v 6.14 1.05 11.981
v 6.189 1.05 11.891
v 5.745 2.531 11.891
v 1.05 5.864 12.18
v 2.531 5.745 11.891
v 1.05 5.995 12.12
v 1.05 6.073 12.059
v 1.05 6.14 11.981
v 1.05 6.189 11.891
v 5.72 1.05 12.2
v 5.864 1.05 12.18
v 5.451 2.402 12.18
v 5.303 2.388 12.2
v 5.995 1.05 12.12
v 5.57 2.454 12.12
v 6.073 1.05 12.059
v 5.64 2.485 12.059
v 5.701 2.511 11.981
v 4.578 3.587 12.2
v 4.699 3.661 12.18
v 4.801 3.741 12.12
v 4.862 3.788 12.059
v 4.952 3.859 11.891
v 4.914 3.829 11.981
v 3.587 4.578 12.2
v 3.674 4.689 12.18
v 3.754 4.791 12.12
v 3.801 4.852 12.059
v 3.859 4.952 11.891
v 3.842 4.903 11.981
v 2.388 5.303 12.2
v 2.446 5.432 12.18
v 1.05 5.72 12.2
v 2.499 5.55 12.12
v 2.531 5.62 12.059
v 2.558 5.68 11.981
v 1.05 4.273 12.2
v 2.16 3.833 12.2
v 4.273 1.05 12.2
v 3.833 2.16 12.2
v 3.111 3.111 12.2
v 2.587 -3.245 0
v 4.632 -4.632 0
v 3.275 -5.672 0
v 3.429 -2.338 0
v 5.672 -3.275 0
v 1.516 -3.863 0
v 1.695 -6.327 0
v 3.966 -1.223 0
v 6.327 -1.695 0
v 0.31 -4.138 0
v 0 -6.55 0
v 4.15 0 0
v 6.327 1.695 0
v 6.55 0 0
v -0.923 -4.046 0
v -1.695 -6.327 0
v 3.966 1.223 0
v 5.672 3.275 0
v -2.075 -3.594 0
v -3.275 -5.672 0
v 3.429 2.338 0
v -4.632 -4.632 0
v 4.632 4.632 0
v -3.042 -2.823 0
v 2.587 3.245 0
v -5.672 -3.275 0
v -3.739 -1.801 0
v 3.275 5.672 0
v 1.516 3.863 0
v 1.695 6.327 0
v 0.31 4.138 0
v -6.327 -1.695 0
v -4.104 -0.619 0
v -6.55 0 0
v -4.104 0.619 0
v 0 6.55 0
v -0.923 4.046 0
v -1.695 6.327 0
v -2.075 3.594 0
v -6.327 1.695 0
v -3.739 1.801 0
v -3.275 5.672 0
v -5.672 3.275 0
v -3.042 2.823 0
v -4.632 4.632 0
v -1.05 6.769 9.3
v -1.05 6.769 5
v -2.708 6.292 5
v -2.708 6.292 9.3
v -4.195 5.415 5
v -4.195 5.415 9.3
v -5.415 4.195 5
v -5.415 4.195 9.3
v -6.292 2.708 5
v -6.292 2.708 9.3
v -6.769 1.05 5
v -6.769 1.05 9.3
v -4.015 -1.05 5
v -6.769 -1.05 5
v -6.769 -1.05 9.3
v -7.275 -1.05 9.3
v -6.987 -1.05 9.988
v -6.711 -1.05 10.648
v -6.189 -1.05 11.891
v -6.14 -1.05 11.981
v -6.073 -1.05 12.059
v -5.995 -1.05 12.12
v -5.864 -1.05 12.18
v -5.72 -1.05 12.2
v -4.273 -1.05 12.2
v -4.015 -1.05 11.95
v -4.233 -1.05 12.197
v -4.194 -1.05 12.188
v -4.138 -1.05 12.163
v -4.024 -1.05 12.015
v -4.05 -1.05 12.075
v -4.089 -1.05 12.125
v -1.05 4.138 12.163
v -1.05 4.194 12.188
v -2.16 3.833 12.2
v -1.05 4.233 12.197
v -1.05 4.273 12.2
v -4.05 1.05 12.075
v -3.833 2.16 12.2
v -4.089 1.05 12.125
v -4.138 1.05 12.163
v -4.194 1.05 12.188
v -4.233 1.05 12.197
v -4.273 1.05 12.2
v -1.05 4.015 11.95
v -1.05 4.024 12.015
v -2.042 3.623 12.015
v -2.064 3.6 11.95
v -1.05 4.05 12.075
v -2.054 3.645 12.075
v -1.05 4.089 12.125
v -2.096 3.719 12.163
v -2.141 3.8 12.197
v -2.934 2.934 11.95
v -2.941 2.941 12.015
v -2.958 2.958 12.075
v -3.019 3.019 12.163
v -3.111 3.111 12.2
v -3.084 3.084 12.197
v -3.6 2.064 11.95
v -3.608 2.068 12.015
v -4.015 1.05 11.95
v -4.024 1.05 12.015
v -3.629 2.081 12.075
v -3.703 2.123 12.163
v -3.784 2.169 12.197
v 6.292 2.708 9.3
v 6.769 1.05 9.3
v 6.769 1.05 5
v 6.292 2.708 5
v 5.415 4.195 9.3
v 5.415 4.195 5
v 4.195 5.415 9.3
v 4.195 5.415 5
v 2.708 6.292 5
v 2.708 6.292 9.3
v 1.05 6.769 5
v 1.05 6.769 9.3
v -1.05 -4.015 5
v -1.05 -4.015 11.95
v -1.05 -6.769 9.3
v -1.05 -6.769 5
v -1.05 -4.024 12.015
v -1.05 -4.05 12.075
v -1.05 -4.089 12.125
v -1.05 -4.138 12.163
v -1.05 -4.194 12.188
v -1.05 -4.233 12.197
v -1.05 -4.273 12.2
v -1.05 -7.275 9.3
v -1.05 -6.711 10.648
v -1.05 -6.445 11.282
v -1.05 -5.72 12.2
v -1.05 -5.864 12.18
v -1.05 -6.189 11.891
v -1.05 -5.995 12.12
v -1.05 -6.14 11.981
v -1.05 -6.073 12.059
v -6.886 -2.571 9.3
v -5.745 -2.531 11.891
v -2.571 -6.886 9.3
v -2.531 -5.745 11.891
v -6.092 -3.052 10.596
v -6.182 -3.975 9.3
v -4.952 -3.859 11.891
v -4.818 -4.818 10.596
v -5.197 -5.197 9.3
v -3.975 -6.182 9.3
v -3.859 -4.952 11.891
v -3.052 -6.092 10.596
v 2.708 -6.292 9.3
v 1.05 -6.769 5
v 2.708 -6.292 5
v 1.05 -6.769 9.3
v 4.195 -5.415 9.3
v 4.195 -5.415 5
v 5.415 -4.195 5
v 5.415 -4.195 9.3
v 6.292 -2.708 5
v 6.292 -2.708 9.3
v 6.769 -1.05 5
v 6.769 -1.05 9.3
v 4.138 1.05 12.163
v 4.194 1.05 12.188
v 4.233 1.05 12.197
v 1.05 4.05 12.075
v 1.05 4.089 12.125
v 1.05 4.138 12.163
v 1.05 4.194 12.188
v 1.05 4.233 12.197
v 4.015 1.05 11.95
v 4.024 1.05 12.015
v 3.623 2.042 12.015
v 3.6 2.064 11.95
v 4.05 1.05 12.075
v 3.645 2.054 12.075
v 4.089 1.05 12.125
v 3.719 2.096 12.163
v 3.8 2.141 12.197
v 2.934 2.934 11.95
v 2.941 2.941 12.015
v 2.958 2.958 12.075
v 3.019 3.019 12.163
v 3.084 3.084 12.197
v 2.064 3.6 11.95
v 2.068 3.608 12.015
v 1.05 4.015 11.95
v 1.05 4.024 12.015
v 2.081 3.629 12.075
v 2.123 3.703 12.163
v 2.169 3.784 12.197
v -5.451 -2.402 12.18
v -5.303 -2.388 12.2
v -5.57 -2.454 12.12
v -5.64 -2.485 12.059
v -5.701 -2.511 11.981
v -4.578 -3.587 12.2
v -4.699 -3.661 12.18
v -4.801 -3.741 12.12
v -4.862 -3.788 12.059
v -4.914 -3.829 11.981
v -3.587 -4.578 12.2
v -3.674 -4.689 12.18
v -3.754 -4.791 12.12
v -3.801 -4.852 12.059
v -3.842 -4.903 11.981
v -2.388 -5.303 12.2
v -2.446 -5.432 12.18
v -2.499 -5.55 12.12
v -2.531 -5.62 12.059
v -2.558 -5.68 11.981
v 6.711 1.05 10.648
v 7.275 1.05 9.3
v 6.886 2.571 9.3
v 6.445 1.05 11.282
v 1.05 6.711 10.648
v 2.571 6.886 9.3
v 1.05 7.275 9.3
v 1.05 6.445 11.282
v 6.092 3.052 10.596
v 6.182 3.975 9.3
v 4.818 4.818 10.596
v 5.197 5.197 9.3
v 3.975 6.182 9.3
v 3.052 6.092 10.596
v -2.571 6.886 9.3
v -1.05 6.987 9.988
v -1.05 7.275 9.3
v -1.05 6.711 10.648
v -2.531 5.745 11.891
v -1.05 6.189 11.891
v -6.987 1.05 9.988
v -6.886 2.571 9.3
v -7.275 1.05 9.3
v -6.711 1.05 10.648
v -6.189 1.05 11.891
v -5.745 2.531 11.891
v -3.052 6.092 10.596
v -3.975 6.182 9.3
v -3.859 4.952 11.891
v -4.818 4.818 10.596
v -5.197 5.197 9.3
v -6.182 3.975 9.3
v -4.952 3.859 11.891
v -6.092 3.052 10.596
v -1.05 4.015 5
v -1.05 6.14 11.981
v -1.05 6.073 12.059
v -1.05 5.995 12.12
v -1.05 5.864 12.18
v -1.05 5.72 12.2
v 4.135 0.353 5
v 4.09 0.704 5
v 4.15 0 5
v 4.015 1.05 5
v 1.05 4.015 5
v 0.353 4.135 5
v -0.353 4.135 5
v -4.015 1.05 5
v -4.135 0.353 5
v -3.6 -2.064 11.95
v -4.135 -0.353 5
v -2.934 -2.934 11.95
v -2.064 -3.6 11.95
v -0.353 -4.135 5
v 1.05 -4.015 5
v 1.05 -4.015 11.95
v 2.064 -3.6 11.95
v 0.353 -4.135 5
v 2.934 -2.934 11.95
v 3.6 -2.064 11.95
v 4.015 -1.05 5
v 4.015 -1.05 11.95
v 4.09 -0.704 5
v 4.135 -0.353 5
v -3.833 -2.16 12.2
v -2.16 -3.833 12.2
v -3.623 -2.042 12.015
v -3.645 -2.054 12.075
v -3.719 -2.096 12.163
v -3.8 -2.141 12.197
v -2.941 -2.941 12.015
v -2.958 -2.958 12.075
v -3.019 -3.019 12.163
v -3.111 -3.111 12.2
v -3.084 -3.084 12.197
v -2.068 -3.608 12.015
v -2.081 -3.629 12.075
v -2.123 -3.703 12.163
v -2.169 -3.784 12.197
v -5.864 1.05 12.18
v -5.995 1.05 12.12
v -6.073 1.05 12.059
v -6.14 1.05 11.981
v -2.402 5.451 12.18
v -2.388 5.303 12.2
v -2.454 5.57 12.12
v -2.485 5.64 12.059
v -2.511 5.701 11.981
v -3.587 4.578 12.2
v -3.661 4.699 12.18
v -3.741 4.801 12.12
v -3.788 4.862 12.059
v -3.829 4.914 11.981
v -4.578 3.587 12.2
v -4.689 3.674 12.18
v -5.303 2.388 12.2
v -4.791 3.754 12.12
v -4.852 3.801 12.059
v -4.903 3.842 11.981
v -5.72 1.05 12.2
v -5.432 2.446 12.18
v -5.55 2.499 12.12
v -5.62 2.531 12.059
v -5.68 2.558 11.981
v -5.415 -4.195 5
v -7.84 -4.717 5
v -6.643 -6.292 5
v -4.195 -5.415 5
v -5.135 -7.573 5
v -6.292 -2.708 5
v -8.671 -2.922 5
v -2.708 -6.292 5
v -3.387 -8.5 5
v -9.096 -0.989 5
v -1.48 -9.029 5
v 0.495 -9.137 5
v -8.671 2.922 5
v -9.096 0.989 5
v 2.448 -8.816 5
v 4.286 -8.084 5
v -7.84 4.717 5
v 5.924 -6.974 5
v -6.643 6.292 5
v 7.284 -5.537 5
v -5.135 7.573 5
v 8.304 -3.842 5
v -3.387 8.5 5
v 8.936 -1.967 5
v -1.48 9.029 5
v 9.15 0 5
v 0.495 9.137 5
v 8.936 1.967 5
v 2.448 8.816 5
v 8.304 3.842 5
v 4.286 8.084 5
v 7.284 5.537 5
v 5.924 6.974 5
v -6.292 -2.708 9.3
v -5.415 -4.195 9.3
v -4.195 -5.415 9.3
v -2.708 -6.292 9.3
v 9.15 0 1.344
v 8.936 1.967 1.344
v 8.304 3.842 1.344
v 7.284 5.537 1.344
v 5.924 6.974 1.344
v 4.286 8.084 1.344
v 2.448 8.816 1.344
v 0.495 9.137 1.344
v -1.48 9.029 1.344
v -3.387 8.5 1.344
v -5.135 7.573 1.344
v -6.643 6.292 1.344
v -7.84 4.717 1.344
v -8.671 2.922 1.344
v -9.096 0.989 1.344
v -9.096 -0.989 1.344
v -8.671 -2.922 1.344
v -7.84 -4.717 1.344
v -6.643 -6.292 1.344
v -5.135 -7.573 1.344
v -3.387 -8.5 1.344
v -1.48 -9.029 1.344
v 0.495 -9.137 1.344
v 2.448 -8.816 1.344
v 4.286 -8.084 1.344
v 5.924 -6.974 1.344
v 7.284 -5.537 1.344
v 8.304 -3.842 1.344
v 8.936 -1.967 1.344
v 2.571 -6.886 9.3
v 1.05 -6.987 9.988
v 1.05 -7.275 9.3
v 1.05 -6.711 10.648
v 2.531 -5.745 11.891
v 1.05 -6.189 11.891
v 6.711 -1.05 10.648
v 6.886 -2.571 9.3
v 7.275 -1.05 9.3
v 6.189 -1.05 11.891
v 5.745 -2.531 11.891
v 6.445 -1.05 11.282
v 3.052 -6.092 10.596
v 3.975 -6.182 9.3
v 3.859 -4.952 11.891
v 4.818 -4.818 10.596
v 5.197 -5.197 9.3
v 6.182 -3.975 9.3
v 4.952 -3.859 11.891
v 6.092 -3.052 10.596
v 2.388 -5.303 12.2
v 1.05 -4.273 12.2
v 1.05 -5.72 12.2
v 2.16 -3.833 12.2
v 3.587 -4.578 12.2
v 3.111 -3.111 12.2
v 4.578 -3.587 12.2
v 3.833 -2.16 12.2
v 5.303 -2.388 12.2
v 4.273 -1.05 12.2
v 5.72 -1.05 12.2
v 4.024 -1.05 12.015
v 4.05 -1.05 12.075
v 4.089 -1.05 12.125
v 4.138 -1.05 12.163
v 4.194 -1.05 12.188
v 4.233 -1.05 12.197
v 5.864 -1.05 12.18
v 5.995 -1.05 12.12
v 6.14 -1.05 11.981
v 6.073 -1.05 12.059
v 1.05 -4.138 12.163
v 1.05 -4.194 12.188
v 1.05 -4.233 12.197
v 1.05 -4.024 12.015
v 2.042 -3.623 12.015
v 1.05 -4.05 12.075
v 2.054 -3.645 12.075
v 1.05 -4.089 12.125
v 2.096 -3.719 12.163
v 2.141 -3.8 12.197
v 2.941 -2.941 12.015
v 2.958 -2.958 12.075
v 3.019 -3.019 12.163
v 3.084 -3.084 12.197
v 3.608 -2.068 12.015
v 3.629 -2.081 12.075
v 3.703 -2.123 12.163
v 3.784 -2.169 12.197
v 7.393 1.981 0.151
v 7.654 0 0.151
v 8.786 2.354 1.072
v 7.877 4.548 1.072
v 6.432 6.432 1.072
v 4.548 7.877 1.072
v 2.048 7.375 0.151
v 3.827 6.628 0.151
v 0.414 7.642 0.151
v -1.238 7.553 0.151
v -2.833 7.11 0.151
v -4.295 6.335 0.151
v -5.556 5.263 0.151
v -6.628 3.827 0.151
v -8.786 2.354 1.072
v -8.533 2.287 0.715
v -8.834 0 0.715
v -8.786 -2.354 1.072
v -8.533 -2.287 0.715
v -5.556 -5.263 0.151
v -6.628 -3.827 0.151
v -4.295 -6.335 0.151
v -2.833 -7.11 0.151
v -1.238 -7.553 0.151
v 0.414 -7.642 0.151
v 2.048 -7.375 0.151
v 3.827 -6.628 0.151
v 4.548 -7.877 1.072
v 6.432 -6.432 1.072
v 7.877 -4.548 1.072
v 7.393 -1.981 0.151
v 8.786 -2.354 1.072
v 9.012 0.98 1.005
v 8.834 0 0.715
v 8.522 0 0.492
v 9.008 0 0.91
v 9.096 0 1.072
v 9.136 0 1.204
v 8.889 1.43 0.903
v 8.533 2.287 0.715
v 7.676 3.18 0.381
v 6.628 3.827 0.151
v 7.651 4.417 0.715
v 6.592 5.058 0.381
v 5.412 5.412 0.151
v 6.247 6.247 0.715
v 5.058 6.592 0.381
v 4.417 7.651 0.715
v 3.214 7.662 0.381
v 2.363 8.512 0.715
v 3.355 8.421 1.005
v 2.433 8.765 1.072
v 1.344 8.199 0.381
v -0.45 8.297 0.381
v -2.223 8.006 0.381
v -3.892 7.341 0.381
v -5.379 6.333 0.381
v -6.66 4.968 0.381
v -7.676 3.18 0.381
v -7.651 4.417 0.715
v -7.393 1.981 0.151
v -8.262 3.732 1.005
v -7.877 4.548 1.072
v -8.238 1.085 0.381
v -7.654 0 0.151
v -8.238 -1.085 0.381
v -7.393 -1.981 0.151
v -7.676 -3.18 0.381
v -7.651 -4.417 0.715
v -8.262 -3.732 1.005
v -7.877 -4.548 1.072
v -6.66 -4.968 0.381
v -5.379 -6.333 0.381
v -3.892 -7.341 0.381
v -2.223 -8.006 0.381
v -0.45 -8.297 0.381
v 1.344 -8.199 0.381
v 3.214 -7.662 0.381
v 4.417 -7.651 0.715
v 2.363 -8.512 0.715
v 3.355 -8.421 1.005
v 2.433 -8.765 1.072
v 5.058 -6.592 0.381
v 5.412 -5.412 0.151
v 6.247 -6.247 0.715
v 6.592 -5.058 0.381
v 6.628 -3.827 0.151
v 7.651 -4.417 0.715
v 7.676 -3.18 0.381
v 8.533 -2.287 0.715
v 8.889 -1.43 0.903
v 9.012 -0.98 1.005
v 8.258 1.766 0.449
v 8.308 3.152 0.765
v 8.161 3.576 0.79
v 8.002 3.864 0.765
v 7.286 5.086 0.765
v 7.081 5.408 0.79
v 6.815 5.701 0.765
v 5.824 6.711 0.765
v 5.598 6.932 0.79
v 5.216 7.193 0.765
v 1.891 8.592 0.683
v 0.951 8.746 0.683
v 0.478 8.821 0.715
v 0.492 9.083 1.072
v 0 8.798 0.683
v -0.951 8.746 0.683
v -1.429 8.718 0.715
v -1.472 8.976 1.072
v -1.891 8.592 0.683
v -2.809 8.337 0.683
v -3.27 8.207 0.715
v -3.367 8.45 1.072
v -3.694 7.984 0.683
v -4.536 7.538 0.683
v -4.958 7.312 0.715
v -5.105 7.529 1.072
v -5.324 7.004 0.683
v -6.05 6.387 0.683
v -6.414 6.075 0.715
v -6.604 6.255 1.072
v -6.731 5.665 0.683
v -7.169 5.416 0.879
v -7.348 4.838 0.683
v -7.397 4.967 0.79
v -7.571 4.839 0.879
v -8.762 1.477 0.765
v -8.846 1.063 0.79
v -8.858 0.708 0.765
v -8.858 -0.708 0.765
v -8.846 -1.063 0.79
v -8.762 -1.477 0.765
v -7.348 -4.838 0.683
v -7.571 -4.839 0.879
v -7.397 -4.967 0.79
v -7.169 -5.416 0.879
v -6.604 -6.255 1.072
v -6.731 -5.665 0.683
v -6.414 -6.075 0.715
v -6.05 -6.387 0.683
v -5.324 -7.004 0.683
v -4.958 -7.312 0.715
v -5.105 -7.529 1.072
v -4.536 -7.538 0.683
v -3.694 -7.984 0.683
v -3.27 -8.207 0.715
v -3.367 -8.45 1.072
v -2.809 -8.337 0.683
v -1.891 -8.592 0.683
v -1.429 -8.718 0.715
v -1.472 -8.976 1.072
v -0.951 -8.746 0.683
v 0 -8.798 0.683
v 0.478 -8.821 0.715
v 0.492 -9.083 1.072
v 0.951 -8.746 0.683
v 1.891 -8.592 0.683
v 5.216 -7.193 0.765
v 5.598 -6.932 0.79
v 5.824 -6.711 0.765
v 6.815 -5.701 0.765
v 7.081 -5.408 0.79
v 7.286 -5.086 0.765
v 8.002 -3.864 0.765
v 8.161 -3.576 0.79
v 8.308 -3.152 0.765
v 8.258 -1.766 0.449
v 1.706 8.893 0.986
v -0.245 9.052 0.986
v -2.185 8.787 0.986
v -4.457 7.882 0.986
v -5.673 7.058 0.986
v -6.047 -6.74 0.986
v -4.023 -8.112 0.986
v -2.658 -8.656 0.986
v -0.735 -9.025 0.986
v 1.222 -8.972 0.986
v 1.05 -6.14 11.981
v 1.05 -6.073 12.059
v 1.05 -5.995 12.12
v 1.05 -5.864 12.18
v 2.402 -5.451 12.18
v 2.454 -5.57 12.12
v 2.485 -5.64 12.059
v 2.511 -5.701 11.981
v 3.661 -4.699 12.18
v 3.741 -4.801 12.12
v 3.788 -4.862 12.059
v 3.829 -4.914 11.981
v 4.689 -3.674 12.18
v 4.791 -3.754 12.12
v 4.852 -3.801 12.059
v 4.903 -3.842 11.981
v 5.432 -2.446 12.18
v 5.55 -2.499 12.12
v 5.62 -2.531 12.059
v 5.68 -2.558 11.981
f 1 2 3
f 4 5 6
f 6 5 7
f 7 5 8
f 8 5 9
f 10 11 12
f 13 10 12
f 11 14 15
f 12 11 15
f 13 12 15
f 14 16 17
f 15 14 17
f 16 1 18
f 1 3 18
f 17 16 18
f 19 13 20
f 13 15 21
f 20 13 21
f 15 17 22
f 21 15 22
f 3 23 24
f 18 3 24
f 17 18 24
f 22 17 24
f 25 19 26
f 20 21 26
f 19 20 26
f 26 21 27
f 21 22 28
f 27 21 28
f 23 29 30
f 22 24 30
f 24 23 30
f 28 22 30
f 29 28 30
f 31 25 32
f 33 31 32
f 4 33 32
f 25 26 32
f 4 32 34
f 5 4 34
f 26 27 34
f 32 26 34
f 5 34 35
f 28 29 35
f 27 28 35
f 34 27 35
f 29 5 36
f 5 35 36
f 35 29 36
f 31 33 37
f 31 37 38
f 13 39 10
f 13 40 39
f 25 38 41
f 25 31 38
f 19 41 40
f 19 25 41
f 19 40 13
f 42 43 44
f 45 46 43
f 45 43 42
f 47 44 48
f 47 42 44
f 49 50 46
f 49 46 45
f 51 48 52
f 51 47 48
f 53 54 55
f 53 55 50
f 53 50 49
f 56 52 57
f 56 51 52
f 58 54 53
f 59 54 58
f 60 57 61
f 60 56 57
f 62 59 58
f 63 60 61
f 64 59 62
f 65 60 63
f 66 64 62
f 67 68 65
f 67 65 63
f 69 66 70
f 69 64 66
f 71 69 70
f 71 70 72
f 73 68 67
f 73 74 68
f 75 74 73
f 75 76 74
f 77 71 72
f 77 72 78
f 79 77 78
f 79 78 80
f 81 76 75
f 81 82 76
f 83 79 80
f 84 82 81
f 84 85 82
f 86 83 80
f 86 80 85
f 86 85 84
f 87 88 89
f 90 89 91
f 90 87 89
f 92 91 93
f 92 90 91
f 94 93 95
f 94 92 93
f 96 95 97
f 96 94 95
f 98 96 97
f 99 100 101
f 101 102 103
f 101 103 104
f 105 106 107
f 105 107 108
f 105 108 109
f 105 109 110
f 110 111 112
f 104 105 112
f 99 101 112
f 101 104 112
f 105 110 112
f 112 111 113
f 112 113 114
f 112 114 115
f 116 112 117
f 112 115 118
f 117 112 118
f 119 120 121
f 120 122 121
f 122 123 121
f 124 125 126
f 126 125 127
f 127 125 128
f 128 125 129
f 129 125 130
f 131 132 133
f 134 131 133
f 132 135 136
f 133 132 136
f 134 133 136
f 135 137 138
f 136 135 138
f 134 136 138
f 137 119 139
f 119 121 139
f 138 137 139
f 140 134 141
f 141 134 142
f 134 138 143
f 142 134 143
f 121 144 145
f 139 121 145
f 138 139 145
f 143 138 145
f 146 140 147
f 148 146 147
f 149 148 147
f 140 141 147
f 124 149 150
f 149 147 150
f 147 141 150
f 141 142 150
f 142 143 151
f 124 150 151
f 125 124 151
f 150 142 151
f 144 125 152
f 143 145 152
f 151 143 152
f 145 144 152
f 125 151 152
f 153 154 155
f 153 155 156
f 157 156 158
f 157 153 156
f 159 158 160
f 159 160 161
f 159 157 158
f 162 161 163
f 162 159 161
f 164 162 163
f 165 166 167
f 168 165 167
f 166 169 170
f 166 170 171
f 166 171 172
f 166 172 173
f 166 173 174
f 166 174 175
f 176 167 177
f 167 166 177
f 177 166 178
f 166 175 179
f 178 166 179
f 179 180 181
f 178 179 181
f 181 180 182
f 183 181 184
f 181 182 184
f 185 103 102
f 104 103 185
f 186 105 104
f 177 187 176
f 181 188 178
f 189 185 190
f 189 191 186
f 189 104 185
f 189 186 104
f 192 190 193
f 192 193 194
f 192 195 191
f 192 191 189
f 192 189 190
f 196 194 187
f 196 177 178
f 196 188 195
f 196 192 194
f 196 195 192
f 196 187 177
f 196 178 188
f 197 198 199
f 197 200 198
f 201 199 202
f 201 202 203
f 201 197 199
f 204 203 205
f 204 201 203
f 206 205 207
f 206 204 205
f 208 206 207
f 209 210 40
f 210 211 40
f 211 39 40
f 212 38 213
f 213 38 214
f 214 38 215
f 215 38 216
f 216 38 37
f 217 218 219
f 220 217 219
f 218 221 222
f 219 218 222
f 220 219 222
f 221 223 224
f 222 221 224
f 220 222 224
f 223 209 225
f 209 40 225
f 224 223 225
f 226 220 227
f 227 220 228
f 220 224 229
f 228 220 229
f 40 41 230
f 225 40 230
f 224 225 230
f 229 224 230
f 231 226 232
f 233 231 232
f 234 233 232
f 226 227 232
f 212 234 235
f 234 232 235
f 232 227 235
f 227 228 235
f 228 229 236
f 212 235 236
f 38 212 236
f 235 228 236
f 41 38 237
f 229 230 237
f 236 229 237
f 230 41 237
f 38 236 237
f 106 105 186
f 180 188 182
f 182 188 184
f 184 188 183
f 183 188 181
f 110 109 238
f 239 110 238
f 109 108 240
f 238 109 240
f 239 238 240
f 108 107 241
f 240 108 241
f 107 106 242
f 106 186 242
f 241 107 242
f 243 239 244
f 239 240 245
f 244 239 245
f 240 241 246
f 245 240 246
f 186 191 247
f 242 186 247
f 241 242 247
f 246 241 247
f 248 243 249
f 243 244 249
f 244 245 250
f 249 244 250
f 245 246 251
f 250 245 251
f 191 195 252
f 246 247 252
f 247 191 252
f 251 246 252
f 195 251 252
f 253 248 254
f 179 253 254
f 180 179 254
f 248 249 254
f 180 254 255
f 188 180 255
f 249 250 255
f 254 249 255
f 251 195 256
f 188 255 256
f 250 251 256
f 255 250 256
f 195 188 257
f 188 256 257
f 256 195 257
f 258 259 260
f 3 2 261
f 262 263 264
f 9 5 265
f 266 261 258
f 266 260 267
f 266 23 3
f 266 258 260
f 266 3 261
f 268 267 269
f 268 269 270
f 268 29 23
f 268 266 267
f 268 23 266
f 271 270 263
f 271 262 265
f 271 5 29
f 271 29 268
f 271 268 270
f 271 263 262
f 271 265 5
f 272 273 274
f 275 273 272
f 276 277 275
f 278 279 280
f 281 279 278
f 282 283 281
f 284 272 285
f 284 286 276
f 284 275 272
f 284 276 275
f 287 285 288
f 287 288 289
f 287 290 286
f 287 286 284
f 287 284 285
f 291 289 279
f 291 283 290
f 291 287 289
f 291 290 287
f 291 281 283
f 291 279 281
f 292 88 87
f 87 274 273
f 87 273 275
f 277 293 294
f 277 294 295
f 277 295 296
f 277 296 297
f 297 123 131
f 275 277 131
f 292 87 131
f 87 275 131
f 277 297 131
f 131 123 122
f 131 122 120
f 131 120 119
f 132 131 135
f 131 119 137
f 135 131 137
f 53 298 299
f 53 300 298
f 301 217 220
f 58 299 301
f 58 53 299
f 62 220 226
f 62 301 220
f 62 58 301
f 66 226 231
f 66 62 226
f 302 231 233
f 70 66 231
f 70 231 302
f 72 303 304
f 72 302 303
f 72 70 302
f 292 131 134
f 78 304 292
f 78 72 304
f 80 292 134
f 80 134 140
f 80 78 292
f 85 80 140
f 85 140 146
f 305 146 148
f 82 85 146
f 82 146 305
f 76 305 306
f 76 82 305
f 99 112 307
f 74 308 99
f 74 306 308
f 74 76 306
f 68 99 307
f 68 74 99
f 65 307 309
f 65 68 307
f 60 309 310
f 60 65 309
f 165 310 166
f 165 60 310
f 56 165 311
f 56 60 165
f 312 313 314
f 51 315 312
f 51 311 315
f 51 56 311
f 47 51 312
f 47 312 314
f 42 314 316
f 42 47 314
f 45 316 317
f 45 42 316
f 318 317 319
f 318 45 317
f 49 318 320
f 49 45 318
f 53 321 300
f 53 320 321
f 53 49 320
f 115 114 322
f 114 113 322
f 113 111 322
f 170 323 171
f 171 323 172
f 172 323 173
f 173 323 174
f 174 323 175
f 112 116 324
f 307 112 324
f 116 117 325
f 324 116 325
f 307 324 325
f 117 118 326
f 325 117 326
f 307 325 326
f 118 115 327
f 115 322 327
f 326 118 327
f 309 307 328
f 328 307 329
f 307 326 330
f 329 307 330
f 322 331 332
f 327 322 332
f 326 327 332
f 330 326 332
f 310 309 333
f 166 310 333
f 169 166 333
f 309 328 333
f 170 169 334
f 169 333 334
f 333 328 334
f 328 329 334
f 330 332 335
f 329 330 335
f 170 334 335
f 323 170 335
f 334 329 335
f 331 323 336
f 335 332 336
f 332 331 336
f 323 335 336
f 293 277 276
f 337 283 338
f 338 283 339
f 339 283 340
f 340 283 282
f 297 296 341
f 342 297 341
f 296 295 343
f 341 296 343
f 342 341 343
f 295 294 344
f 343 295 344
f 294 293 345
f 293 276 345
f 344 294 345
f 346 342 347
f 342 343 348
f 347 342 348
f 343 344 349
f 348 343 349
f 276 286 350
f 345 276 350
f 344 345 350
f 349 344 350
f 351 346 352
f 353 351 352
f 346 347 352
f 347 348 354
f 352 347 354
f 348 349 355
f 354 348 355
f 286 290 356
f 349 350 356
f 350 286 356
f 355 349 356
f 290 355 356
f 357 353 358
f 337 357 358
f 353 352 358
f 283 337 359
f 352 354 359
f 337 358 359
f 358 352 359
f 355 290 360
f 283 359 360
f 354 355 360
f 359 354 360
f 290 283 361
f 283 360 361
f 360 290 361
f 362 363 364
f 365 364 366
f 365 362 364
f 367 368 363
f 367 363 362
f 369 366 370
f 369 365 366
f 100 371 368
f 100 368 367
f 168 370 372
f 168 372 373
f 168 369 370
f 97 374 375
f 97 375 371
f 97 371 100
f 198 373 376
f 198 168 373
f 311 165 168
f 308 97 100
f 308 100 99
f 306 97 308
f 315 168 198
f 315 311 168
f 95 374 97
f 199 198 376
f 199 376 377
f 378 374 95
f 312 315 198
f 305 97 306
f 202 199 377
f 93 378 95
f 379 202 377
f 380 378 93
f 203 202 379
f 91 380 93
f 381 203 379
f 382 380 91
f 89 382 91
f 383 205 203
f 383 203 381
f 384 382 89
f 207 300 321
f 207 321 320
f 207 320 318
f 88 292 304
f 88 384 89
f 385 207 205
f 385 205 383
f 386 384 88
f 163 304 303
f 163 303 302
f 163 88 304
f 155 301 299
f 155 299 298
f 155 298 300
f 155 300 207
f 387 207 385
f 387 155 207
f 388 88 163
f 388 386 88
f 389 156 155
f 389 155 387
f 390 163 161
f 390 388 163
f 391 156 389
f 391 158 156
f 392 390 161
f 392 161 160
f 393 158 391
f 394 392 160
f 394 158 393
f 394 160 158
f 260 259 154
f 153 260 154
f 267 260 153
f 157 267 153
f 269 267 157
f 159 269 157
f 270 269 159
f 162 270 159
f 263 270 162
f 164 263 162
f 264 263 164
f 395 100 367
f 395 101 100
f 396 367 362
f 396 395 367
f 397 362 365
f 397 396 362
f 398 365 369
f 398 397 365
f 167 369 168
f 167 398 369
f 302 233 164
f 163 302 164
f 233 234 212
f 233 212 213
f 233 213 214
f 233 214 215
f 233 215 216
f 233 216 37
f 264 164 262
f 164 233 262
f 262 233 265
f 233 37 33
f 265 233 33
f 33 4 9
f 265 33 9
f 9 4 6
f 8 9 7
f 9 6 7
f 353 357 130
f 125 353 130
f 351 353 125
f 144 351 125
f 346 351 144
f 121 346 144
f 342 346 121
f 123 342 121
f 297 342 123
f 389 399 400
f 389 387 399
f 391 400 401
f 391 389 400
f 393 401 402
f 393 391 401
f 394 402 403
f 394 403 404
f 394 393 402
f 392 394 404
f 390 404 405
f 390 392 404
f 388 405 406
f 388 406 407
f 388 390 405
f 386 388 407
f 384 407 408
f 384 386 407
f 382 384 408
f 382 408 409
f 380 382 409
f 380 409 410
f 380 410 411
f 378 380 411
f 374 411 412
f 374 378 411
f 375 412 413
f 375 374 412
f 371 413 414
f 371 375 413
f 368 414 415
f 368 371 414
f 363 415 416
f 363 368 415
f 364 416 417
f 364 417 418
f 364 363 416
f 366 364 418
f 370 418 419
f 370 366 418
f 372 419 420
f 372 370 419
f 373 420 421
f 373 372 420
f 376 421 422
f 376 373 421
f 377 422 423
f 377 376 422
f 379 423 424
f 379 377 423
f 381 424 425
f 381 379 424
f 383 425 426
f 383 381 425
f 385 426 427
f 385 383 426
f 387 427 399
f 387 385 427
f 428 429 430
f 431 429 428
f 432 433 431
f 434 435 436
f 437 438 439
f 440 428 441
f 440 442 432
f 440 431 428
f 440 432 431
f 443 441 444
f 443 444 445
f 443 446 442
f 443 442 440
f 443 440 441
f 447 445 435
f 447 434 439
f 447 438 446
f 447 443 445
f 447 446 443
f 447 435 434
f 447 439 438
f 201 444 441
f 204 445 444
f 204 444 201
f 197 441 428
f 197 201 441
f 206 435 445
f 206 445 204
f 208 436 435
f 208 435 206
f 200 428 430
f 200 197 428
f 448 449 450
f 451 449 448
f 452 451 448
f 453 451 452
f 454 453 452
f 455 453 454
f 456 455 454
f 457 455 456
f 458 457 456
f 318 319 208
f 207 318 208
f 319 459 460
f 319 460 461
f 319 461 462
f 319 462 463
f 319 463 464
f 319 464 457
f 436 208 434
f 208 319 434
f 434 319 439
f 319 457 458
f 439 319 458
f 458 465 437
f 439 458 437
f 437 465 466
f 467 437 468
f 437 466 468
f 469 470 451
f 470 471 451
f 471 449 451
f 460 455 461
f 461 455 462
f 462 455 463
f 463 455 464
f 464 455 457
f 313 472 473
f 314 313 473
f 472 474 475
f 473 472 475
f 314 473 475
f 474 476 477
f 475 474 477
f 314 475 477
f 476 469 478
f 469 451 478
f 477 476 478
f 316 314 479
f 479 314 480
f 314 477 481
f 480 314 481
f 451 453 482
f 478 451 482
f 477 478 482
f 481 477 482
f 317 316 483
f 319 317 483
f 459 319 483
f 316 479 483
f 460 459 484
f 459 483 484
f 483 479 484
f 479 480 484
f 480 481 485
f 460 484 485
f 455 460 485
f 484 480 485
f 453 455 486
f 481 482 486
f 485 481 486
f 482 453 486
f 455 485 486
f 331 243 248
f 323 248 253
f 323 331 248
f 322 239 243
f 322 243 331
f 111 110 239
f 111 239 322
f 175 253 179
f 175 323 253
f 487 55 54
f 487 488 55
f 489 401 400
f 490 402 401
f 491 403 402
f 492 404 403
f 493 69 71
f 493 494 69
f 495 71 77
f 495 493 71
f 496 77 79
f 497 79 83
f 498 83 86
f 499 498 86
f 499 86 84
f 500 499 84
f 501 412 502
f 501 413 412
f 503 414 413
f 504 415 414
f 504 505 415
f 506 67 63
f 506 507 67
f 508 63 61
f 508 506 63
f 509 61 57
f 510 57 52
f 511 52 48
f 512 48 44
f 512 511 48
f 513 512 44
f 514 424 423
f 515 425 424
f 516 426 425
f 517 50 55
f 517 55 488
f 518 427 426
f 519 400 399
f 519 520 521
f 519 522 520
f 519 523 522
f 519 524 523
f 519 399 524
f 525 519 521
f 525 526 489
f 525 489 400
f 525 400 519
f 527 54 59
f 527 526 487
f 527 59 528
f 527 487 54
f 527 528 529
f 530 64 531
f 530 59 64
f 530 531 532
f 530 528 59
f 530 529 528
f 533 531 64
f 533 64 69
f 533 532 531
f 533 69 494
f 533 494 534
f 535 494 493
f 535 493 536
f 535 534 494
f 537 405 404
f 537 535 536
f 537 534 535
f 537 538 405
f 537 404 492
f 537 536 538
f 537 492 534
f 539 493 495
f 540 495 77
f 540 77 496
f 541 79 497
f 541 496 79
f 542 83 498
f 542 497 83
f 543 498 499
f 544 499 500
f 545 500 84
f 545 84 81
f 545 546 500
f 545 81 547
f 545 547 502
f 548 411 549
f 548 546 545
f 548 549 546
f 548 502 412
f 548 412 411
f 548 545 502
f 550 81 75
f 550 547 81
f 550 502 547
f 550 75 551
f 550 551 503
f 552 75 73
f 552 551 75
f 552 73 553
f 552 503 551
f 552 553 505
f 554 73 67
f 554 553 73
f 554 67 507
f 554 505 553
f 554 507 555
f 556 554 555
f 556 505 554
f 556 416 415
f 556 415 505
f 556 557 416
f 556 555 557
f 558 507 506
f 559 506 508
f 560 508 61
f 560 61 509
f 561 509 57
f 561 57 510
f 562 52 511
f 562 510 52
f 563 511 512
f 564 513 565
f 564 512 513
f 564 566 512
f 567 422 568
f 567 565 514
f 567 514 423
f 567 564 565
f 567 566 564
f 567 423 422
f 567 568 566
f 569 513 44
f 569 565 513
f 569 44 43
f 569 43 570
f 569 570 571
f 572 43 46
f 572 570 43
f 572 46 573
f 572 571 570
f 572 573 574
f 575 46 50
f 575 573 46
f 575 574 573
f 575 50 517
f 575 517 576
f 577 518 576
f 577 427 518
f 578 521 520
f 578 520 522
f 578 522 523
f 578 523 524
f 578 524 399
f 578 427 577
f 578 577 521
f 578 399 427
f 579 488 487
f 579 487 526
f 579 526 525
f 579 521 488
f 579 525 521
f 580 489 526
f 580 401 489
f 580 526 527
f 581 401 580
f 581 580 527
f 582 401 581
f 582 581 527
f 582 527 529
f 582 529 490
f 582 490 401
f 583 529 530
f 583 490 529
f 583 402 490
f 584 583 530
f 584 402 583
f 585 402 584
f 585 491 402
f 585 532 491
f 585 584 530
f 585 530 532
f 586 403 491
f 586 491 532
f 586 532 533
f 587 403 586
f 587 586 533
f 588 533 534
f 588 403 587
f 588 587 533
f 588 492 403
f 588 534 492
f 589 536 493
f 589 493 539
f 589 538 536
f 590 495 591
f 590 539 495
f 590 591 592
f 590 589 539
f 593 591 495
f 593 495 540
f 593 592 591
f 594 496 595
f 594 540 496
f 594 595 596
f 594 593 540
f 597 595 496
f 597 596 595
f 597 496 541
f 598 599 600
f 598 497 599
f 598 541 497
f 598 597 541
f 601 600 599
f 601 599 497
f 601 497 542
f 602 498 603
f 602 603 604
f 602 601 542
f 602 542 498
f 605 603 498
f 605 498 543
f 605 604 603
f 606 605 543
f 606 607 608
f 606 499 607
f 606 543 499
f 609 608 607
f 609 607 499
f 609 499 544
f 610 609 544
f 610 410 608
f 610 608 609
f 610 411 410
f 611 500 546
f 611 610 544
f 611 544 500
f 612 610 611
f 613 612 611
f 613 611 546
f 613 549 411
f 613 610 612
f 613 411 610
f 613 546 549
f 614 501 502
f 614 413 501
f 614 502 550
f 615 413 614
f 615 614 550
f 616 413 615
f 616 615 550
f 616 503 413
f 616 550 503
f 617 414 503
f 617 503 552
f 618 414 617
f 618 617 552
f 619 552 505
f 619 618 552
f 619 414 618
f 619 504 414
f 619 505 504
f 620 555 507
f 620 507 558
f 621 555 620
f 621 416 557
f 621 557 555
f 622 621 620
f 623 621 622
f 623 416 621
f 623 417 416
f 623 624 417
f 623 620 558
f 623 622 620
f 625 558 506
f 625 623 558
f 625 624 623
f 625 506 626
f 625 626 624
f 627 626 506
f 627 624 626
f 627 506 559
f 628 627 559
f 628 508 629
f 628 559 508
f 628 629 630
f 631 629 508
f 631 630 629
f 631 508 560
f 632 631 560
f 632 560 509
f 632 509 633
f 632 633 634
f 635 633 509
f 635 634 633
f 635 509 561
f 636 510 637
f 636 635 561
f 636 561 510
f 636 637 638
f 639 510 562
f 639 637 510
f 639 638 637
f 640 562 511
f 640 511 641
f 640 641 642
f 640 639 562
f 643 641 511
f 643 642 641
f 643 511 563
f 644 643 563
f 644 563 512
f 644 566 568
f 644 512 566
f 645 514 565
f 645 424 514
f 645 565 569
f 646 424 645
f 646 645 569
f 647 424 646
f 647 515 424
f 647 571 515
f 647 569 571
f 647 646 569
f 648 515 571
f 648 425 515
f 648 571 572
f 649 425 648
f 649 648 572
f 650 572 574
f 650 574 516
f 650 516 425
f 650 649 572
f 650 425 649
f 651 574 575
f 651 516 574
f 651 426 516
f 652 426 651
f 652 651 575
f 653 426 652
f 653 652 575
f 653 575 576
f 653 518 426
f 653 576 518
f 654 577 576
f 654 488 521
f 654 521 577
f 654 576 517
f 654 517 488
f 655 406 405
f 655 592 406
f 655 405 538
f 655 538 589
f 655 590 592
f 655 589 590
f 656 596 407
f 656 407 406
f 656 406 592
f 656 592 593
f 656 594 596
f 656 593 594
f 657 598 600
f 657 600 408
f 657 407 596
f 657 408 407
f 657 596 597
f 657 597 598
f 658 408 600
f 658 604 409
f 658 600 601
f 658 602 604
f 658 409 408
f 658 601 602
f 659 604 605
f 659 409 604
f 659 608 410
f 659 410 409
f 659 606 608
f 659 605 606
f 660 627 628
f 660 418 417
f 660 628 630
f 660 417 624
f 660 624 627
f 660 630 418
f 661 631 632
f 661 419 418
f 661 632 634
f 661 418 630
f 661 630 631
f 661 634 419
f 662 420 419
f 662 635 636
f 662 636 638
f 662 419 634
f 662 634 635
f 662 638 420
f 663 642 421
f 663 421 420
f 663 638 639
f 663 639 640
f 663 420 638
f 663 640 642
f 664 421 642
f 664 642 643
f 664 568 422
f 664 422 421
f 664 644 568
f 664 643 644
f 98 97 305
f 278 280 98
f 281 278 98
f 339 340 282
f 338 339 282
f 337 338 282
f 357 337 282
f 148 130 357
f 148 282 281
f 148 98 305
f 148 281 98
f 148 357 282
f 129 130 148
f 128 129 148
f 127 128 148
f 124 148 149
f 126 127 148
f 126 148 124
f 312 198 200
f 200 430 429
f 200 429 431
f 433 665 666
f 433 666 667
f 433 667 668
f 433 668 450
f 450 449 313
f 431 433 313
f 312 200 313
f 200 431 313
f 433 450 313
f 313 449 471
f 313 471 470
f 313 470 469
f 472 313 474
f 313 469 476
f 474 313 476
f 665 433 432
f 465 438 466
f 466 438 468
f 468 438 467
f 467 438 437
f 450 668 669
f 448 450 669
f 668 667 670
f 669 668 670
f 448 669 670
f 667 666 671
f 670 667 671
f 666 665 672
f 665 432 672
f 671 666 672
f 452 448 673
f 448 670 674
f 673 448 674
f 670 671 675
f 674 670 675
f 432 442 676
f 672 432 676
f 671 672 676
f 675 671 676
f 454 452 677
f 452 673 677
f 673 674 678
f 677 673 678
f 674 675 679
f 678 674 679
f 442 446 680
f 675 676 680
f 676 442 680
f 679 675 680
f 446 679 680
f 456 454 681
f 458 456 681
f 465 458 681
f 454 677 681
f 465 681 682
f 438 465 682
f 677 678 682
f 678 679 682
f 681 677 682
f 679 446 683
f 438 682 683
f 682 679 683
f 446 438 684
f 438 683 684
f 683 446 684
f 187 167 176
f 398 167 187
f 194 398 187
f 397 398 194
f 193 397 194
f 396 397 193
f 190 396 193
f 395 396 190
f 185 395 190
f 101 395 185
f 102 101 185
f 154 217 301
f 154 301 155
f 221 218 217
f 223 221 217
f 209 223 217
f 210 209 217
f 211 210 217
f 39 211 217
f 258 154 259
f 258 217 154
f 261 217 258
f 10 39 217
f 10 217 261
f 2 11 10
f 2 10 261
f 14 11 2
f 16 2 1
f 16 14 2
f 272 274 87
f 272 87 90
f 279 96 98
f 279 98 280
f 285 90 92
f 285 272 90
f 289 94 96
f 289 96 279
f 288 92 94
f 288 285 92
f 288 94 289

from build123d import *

# Parameters (mm, degrees)
F2_W     = 2.1
F2_H     = 6.45
F2_W_2   = 6.45
F2_H_2   = 2.1
F3_DEPTH = 7.2
F4_R     = 0.25
F5_R     = 0.5


with BuildPart() as f1:
    # F0 (on Front) → F1 (revolve)
    with BuildSketch(Plane.XZ):
        with BuildLine():
            Line((4.15, 12.2), (4.15, 0))
            Line((4.15, 0), (6.55, 0))
            add(Edge.make_bspline(
                [(6.55, 0), (7.5164148551, 0), (9.15, 0.4540091534), (9.15, 1.3436317709)],
                knots=[0, 0, 0, 0, 2.926661295, 2.926661295, 2.926661295, 2.926661295], degree=3))
            Line((9.15, 1.3436317709), (9.15, 5))
            Line((9.15, 5), (6.85, 5))
            Line((6.85, 5), (6.85, 9.3))
            Line((6.85, 9.3), (7.35, 9.3))
            Line((7.35, 9.3), (6.15, 12.2))
            Line((6.15, 12.2), (4.15, 12.2))
        make_face()
    revolve(axis=Axis((0, 0, 4.5666272921), (0, 0, 1)))

    # F2 (on face) → F3 (cut)
    with BuildSketch(Plane.XY.offset(12.2)):
        with Locations((0, 4.275)):
            Rectangle(F2_W, F2_H)
        with Locations((4.275, 0)):
            Rectangle(F2_W_2, F2_H_2)
        Rectangle(F2_W, F2_H_2)
        with Locations((0, -4.275)):
            Rectangle(F2_W, F2_H)
        with Locations((-4.275, 0)):
            Rectangle(F2_W_2, F2_H_2)
    extrude(amount=-F3_DEPTH, mode=Mode.SUBTRACT)

    # F4
    f4_edges = [f1.edges().sort_by_distance(p)[0] for p in [
        (-2.934493, -2.934493, 12.2),
        (-2.934493, 2.934493, 12.2),
        (2.934493, 2.934493, 12.2),
        (2.934493, -2.934493, 12.2),
    ]]
    fillet(f4_edges, radius=F4_R)

    # F5
    f5_edges = [f1.edges().sort_by_distance(p)[0] for p in [
        (4.348707, 4.348707, 12.2),
        (-4.348707, 4.348707, 12.2),
        (-4.348707, -4.348707, 12.2),
        (4.348707, -4.348707, 12.2),
    ]]
    fillet(f5_edges, radius=F5_R)


solid = f1.part
